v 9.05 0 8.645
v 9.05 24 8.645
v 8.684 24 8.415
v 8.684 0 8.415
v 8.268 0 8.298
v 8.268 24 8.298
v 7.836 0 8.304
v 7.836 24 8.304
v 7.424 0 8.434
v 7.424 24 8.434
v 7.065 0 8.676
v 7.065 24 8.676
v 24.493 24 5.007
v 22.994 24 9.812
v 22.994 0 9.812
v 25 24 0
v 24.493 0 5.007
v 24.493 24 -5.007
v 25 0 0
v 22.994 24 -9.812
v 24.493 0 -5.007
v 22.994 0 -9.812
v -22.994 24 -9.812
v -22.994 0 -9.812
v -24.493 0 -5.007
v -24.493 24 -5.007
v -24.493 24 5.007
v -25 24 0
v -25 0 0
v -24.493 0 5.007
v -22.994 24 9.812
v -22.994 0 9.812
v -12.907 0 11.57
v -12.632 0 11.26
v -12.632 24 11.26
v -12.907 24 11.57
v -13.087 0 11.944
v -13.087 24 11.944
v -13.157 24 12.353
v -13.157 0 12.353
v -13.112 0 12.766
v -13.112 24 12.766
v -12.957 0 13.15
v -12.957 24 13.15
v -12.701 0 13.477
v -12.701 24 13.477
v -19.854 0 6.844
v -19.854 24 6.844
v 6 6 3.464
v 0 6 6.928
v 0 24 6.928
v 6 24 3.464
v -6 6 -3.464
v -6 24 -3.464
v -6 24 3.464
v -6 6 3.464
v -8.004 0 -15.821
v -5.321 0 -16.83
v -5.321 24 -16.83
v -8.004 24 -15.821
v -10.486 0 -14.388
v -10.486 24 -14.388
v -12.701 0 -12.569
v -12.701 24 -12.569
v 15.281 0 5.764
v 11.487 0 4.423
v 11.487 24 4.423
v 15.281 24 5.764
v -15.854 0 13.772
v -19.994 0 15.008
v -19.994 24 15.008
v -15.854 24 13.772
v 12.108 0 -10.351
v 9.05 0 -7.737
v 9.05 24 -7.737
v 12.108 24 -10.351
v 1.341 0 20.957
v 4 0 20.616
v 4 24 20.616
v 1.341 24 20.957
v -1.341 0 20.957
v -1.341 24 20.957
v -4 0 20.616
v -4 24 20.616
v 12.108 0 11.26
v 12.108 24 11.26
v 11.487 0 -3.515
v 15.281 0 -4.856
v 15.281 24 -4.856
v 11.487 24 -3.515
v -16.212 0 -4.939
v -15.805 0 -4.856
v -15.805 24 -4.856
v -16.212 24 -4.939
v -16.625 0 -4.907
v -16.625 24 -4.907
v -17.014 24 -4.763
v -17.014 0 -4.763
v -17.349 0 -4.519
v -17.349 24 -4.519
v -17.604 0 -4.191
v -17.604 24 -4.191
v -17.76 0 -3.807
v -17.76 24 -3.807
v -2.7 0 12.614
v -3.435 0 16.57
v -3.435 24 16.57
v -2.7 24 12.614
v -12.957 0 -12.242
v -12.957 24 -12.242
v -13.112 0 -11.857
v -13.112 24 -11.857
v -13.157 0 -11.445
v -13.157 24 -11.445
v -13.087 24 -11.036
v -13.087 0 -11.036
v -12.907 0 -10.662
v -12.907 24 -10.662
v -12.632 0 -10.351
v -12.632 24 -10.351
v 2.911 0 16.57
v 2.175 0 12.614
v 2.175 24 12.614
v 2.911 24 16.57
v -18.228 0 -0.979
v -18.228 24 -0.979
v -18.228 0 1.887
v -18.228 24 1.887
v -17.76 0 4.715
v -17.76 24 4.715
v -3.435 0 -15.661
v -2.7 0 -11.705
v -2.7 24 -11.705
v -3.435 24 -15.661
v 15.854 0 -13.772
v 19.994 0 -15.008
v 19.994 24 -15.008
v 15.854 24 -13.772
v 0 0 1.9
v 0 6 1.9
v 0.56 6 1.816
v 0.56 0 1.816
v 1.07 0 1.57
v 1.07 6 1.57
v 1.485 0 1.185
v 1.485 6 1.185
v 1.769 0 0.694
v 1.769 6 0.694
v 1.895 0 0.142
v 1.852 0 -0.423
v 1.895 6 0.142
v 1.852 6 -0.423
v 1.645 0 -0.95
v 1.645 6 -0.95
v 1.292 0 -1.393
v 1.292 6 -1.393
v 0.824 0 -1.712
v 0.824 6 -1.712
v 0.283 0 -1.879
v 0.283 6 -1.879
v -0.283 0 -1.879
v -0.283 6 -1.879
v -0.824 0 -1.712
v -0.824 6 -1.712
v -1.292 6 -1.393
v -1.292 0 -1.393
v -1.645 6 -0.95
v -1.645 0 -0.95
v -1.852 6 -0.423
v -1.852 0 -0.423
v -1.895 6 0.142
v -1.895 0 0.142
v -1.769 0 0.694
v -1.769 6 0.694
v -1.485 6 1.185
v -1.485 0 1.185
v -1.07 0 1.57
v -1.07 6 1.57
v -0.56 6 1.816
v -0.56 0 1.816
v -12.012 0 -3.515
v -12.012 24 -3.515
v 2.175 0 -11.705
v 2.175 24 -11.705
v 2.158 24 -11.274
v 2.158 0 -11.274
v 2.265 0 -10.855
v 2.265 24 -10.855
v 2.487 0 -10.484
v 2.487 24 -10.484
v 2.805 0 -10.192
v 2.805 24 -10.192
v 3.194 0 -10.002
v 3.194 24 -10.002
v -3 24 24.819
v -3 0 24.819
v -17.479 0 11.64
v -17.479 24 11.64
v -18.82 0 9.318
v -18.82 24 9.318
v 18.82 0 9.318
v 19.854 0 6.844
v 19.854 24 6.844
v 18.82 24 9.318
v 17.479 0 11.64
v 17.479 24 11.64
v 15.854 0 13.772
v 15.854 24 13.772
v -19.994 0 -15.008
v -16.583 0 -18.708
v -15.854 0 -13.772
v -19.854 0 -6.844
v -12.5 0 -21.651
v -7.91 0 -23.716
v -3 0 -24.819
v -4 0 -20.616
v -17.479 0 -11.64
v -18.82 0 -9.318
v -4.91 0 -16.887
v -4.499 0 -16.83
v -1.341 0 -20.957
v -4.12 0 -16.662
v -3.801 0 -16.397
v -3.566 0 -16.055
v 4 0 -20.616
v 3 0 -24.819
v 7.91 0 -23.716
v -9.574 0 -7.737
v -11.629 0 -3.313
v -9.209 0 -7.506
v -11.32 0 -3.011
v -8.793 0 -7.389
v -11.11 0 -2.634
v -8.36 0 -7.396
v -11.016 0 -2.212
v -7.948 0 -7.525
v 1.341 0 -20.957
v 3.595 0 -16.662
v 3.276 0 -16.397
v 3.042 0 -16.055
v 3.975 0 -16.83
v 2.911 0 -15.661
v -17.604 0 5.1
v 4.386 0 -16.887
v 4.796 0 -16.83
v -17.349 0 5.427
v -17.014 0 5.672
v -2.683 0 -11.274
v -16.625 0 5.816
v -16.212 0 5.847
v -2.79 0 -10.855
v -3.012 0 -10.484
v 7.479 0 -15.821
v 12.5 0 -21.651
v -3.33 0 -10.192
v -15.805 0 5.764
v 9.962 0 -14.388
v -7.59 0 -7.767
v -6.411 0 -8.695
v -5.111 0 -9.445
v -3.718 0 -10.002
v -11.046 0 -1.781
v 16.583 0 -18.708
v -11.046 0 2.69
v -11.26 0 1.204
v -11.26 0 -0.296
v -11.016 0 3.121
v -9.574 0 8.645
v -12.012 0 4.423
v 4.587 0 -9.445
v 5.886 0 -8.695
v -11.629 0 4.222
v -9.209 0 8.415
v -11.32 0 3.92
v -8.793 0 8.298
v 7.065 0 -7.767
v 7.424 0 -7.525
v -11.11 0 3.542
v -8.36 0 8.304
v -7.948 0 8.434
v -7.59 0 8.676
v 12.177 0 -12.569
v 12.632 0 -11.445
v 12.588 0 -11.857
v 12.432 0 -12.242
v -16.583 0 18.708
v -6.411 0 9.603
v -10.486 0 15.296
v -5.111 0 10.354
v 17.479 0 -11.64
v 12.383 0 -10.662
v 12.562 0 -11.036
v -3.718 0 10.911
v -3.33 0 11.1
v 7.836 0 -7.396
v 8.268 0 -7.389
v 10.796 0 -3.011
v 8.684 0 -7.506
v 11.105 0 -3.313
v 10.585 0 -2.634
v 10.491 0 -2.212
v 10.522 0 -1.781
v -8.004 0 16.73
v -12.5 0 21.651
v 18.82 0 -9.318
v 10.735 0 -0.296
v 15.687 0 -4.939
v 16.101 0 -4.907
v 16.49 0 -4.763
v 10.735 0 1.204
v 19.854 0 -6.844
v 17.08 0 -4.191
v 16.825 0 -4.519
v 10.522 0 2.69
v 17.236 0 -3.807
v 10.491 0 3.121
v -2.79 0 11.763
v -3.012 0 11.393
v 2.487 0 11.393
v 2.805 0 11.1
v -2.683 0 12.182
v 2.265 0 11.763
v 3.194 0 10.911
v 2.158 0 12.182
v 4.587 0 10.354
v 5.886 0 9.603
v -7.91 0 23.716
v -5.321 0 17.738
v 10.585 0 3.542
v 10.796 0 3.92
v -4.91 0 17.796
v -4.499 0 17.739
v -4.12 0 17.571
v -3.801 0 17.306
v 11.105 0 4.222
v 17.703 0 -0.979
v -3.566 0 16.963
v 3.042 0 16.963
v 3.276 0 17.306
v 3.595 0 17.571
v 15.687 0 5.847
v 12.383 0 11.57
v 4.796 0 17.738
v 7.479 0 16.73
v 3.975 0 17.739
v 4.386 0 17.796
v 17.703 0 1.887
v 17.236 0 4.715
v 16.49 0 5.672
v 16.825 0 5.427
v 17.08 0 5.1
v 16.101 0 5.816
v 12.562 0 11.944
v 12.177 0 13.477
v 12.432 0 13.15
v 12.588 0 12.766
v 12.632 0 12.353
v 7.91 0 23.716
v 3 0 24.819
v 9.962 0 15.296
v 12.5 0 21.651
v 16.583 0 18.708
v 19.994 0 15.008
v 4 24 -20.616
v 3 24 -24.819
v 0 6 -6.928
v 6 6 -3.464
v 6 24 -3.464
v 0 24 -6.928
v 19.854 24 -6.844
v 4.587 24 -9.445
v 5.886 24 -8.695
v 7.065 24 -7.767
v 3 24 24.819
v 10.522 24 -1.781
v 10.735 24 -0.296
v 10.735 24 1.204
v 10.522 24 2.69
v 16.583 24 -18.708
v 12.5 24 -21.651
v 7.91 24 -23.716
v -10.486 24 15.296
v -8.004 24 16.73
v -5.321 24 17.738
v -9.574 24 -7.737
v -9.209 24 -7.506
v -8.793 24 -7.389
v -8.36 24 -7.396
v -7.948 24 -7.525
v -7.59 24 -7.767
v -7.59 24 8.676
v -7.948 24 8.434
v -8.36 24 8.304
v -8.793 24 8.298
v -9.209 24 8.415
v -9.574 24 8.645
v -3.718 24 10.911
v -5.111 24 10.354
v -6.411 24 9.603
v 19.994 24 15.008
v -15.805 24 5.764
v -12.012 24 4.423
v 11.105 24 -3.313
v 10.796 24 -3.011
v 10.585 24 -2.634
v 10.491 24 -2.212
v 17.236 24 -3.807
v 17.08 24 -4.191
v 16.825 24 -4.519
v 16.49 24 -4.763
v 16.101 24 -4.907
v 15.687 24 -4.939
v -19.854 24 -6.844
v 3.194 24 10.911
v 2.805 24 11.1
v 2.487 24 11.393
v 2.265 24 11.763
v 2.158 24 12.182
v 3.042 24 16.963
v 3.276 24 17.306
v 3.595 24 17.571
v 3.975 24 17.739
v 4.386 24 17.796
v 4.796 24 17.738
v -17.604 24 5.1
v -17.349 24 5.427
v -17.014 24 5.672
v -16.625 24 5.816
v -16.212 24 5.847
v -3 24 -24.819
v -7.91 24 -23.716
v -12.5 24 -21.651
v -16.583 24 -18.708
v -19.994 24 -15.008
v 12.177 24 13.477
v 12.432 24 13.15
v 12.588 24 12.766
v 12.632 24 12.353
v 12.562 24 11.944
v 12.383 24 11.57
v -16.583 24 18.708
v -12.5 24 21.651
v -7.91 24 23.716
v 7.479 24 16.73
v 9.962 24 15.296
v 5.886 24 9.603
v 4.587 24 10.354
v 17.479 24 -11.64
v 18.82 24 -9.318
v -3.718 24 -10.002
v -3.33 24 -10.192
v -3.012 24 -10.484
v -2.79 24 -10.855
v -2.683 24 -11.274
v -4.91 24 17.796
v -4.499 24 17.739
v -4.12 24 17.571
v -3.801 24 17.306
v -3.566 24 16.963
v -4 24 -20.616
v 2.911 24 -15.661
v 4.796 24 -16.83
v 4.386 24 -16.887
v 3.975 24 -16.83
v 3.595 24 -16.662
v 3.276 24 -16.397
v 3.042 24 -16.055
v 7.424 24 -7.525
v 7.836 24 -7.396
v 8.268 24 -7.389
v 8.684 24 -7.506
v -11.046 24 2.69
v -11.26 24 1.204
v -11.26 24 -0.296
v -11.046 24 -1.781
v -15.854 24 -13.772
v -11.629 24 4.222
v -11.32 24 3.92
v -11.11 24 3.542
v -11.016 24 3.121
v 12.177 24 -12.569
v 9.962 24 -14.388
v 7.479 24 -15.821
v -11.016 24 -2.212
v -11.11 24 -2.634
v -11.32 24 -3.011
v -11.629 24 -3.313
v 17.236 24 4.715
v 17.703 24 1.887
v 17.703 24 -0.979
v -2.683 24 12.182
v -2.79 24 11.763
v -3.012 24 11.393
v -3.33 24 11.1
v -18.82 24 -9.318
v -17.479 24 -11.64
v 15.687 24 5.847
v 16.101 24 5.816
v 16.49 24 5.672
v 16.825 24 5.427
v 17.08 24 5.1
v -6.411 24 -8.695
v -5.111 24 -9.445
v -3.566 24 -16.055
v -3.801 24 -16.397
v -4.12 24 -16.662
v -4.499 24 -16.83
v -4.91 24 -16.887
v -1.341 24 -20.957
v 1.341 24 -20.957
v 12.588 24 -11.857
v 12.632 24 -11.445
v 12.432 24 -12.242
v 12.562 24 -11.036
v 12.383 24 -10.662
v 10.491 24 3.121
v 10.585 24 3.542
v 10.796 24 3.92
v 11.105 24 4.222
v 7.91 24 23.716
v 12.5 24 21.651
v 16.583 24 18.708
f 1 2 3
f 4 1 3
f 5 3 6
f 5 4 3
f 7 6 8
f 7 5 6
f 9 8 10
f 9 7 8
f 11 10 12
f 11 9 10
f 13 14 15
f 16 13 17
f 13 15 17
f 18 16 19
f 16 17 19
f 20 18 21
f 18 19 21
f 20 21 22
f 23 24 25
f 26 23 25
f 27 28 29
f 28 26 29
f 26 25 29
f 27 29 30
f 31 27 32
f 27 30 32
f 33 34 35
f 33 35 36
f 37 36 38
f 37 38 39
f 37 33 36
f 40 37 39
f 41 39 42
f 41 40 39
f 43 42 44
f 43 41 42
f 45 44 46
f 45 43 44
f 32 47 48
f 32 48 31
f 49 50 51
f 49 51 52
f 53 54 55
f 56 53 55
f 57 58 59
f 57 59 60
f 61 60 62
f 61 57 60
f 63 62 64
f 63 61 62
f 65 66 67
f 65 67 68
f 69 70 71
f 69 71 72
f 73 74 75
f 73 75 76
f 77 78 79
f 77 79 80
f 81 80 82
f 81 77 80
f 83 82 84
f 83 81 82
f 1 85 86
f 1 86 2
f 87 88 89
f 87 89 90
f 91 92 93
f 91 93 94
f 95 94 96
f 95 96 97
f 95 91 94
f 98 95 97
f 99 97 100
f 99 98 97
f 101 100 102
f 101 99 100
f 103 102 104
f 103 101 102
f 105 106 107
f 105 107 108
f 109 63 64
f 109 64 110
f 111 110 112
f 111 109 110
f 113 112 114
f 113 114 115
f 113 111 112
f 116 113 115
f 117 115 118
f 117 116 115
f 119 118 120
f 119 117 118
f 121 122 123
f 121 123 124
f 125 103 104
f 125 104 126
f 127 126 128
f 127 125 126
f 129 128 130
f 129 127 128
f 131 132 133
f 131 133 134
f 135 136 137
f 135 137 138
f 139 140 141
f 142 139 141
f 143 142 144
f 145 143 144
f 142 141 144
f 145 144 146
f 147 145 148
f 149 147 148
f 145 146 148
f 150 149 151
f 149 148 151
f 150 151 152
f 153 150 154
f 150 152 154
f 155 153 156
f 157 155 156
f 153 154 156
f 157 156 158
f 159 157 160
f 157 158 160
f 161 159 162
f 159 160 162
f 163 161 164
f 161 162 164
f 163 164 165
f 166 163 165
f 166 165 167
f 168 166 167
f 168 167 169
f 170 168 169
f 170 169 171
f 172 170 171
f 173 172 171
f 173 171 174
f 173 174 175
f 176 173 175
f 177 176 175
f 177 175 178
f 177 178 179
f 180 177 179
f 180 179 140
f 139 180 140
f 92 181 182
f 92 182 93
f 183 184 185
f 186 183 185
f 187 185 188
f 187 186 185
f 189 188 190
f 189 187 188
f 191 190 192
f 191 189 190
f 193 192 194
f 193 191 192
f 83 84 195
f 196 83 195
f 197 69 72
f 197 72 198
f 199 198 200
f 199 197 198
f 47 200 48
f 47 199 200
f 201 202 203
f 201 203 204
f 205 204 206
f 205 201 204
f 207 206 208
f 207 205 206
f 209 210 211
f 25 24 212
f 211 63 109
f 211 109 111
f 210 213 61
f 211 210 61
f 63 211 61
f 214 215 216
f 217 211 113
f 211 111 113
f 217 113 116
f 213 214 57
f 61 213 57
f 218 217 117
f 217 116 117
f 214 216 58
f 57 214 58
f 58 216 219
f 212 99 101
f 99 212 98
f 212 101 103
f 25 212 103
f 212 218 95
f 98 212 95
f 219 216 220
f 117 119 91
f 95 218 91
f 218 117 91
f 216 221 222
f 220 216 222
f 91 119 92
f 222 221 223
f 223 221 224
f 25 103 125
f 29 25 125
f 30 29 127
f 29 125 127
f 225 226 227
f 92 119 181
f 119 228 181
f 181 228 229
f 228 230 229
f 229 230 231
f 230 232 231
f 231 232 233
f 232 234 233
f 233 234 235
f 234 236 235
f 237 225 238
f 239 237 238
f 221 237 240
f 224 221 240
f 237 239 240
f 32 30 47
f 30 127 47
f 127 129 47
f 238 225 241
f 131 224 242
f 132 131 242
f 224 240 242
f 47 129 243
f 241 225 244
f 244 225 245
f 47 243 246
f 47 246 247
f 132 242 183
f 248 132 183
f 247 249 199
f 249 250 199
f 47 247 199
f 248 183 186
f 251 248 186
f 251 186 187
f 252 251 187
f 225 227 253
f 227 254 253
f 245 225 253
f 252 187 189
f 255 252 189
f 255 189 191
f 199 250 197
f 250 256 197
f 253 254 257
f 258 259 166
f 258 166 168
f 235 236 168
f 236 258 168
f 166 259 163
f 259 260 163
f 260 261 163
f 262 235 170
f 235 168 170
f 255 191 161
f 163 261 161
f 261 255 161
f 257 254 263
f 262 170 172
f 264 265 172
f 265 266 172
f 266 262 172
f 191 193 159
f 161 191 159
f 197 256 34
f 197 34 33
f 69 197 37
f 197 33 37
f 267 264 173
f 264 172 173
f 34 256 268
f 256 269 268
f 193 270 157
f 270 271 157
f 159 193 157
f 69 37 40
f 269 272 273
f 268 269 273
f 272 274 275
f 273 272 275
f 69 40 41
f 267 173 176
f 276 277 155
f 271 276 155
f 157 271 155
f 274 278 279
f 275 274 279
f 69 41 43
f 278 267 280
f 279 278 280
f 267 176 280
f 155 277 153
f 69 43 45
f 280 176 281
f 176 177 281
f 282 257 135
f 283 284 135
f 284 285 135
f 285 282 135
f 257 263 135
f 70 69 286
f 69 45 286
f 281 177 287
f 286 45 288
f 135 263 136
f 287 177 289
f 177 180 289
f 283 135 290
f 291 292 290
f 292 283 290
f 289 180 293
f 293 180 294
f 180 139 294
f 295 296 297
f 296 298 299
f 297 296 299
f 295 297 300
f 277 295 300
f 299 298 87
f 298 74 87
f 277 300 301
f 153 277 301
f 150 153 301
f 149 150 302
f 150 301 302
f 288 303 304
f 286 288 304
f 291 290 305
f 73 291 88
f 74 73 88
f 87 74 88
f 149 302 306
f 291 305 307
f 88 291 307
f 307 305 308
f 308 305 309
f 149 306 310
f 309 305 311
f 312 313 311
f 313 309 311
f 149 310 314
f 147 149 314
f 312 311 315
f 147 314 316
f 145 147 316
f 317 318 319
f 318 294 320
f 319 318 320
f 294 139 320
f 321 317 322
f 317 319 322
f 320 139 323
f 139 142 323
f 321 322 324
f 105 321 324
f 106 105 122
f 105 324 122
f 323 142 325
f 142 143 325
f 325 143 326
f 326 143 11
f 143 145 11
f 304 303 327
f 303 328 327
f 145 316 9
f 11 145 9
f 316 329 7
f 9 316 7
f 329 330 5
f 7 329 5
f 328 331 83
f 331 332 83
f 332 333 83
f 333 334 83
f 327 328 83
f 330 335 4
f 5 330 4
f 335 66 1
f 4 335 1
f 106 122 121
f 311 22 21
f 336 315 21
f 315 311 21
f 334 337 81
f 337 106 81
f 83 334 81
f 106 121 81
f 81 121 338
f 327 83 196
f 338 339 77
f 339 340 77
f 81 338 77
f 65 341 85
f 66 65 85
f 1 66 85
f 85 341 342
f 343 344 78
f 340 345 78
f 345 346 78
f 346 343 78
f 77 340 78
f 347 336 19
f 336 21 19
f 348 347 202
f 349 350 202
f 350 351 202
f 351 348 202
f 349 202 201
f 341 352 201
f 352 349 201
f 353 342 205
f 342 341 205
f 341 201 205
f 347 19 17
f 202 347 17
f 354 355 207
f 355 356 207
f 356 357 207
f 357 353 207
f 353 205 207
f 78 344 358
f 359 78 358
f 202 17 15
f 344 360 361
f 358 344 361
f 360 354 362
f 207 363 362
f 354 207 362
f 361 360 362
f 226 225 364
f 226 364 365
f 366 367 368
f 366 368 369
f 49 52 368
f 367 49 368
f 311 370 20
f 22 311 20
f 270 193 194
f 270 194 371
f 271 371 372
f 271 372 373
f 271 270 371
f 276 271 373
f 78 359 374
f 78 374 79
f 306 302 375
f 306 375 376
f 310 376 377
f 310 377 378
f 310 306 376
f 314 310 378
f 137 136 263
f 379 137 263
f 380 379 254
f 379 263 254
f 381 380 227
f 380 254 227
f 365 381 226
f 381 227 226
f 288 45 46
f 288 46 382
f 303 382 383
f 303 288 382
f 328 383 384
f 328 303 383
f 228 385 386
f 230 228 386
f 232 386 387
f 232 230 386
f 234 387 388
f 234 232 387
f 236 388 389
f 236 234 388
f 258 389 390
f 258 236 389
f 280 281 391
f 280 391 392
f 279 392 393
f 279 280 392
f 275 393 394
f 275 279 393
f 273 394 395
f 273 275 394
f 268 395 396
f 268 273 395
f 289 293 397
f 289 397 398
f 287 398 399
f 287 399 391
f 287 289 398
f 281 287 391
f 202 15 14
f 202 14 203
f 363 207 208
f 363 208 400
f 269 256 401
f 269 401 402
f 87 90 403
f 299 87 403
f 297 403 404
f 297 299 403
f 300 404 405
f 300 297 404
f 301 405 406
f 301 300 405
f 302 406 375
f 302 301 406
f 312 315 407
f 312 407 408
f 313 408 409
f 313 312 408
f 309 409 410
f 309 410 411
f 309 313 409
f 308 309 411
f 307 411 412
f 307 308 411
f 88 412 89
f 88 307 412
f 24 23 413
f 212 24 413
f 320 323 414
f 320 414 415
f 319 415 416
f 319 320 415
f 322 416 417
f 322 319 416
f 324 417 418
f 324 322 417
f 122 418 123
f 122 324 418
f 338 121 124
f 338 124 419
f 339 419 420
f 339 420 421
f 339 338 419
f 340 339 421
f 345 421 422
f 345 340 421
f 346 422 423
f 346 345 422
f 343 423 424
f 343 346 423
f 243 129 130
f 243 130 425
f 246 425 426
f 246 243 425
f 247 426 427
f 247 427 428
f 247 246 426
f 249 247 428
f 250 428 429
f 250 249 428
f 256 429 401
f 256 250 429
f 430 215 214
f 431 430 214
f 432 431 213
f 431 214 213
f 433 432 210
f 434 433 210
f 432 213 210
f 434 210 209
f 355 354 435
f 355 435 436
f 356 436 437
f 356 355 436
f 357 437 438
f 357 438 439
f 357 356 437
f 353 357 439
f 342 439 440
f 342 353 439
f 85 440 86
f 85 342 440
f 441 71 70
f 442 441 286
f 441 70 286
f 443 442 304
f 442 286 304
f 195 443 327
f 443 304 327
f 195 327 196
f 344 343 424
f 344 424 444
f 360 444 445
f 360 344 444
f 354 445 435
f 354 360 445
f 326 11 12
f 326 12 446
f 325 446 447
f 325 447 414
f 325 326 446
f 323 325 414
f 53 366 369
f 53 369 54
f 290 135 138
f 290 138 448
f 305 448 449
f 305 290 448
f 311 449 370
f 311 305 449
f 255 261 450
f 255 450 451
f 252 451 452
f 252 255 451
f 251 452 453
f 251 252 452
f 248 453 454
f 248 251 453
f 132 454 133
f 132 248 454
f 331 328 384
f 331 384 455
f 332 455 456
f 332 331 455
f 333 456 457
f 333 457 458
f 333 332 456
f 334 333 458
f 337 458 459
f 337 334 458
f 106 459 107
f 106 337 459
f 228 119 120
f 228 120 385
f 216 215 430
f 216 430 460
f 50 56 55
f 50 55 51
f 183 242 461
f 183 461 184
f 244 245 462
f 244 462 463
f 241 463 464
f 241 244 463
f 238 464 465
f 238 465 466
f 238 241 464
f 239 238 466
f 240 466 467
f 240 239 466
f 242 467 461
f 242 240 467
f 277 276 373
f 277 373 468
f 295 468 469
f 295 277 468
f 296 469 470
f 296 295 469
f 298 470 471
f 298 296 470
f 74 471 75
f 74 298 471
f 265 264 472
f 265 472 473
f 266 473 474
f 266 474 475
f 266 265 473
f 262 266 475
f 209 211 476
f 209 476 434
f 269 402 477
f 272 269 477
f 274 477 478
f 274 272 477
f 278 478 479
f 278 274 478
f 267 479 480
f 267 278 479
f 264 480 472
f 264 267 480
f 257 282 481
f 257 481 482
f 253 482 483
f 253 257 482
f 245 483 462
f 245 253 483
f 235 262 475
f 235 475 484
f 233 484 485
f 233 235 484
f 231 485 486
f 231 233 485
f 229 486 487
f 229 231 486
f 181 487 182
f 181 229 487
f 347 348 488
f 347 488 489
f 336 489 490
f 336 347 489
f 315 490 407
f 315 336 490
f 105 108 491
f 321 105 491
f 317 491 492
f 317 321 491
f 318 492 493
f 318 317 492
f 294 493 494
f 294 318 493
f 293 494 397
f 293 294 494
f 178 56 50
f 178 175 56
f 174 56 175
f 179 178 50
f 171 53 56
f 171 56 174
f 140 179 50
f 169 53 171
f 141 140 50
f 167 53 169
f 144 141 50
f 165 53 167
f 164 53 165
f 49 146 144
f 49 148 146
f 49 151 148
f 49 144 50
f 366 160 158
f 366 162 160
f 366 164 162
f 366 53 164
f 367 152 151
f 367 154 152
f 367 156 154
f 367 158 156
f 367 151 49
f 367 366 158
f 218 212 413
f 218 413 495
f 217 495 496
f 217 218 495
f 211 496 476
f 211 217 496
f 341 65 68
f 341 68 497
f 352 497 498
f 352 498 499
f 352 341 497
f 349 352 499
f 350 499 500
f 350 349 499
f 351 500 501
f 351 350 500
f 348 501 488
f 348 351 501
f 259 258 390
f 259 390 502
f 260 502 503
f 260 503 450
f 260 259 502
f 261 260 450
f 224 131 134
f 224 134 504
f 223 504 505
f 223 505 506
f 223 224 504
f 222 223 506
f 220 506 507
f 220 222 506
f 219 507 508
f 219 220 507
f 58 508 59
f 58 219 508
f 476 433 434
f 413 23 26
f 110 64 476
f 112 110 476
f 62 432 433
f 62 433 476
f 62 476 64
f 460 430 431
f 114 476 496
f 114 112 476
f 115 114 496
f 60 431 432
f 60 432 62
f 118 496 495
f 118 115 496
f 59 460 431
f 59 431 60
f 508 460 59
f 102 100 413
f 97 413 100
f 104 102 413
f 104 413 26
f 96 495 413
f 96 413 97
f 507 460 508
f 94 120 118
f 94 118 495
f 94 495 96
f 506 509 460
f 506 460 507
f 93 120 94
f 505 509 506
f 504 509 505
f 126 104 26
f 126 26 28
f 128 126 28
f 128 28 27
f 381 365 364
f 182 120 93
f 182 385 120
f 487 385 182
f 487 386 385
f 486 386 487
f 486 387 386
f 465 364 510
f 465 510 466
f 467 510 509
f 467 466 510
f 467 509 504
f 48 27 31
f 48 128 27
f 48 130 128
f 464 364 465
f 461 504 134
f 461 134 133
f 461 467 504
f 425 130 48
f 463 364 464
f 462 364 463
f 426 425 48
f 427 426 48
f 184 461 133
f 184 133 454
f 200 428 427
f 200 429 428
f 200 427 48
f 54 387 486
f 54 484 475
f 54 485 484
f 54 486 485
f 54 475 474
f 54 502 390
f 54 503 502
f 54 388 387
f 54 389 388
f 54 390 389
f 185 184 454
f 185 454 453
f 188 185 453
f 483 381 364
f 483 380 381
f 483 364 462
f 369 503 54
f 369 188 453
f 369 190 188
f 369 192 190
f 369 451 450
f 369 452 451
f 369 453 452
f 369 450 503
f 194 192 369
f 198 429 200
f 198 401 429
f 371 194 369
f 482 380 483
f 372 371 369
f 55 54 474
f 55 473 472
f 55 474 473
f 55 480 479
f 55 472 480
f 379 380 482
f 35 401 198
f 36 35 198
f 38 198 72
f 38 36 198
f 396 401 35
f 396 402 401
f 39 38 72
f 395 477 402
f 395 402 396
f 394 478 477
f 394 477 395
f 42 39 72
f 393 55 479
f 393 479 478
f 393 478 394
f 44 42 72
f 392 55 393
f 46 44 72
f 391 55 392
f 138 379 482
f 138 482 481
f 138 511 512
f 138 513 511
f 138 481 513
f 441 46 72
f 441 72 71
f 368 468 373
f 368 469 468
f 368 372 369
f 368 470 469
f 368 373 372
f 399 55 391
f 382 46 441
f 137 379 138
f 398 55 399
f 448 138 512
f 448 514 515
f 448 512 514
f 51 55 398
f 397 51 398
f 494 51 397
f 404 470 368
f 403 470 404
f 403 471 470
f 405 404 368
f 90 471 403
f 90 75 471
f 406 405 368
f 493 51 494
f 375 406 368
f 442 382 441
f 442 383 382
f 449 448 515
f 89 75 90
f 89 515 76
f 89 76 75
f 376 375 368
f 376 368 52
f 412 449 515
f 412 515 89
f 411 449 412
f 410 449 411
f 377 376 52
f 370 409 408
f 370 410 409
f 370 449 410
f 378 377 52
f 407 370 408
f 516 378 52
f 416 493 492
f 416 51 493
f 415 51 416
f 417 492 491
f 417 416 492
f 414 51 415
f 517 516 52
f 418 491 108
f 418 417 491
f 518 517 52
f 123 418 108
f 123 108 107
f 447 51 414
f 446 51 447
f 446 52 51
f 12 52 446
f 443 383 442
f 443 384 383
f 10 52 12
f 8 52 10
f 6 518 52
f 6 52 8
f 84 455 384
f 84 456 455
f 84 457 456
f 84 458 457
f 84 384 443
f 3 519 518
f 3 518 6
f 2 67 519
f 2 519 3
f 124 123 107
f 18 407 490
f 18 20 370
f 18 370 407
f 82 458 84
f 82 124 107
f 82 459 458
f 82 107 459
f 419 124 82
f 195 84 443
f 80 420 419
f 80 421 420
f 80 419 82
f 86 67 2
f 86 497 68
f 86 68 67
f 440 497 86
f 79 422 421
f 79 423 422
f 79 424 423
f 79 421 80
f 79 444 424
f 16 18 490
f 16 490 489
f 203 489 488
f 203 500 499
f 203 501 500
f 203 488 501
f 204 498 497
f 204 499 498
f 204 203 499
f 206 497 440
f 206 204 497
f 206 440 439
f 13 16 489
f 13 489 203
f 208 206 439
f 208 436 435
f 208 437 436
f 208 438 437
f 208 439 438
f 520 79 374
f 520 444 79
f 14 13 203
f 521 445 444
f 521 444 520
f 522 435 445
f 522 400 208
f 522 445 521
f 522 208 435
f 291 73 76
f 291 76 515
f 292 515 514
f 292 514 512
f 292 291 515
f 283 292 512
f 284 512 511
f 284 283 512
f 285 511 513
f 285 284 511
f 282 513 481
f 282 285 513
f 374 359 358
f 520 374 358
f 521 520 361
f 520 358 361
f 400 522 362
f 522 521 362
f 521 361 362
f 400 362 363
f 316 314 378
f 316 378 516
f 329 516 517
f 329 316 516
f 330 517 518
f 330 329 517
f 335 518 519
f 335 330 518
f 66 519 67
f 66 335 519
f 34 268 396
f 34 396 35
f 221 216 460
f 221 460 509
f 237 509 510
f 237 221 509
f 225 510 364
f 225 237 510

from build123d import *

# Parameters (mm, degrees)
SKETCH1_R           = 25
BOSS_EXTRUDE1_DEPTH = 24
CUT_EXTRUDE3_START  = -2
CUT_EXTRUDE3_DEPTH  = 45.731721238
CIRPATTERN1_COUNT   = 6
CUT_EXTRUDE4_DEPTH  = 24
CIRPATTERN5_COUNT   = 6
CUT_EXTRUDE5_DEPTH  = 18
SKETCH6_R           = 1.9
CUT_EXTRUDE6_DEPTH  = 18


with BuildPart() as part:
    # Sketch1 → Boss-Extrude1 (new body)
    with BuildSketch(Plane(origin=(0, 0, 0), x_dir=(1, 0, 0), z_dir=(0, 1, 0))):
        with Locations(Location((0, 0, 0), (0, 0, 270))):
            Circle(SKETCH1_R)
    extrude(amount=BOSS_EXTRUDE1_DEPTH)

    # Sketch2 → Cut-Extrude3 (cut)
    with BuildSketch(Plane(origin=(0, 0, 0), x_dir=(1, 0, 0), z_dir=(0, 1, 0)).offset(CUT_EXTRUDE3_START)):
        with BuildLine():
            Line((-3, 24.819347292), (-4, 20.615528128))
            ThreePointArc((-4, 20.615528128), (0, 21), (4, 20.615528128))
            Line((4, 20.615528128), (3, 24.819347292))
            ThreePointArc((3, 24.819347292), (0, 25), (-3, 24.819347292))
        make_face()
    cut_extrude3 = extrude(amount=CUT_EXTRUDE3_DEPTH, mode=Mode.SUBTRACT)

    # CirPattern1: Cut-Extrude3 ×6 about axis
    cirpattern1_axis = Axis((0, 0, 0), (0, 1, 0))
    for i in range(1, CIRPATTERN1_COUNT):
        add(cut_extrude3.rotate(cirpattern1_axis, i * 360 / CIRPATTERN1_COUNT), mode=Mode.SUBTRACT)

    # Sketch3 → Cut-Extrude4 (cut)
    with BuildSketch(Plane(origin=(0, 0, 0), x_dir=(1, 0, 0), z_dir=(0, 1, 0))):
        with BuildLine():
            ThreePointArc((7.065480282, 7.767173771), (8.051747799, 7.376947701), (9.04955872, 7.736632793))
            Line((9.04955872, 7.736632793), (12.107901914, 10.351266166))
            ThreePointArc((12.107901914, 10.351266166), (12.632451903, 11.444743237), (12.176913221, 12.568722465))
            ThreePointArc((12.176913221, 12.568722465), (8.75, 15.155444566), (4.796376338, 16.829877422))
            ThreePointArc((4.796376338, 16.829877422), (3.595212432, 16.662395879), (2.910508504, 15.661383727))
            Line((2.910508504, 15.661383727), (2.175341178, 11.705464141))
            ThreePointArc((2.175341178, 11.705464141), (2.362750212, 10.661491989), (3.19382966, 10.0024723))
            ThreePointArc((3.19382966, 10.0024723), (5.25, 9.09326674), (7.065480282, 7.767173771))
        make_face()
    cut_extrude4 = extrude(amount=CUT_EXTRUDE4_DEPTH, mode=Mode.SUBTRACT)

    # CirPattern5: Cut-Extrude4 ×6 about axis
    cirpattern5_axis = Axis((-0.262257429, 0, 0.454243191), (0, 1, 0))
    for i in range(1, CIRPATTERN5_COUNT):
        add(cut_extrude4.rotate(cirpattern5_axis, i * 360 / CIRPATTERN5_COUNT), mode=Mode.SUBTRACT)

    # Sketch5 → Cut-Extrude5 (cut)
    with BuildSketch(Plane(origin=(0, 24, 0), x_dir=(1, 0, 0), z_dir=(0, 1, 0))):
        Polygon((0, 6.92820323), (-6, 3.464101615), (-6, -3.464101615), (0, -6.92820323), (6, -3.464101615), (6, 3.464101615), align=None)
    extrude(amount=-CUT_EXTRUDE5_DEPTH, mode=Mode.SUBTRACT)

    # Sketch6 → Cut-Extrude6 (cut)
    with BuildSketch(Plane(origin=(0, 6, 0), x_dir=(1, 0, 0), z_dir=(0, 1, 0))):
        with Locations(Location((0, 0, 0), (0, 0, 270))):
            Circle(SKETCH6_R)
    extrude(amount=-CUT_EXTRUDE6_DEPTH, mode=Mode.SUBTRACT)


solid = part.part
